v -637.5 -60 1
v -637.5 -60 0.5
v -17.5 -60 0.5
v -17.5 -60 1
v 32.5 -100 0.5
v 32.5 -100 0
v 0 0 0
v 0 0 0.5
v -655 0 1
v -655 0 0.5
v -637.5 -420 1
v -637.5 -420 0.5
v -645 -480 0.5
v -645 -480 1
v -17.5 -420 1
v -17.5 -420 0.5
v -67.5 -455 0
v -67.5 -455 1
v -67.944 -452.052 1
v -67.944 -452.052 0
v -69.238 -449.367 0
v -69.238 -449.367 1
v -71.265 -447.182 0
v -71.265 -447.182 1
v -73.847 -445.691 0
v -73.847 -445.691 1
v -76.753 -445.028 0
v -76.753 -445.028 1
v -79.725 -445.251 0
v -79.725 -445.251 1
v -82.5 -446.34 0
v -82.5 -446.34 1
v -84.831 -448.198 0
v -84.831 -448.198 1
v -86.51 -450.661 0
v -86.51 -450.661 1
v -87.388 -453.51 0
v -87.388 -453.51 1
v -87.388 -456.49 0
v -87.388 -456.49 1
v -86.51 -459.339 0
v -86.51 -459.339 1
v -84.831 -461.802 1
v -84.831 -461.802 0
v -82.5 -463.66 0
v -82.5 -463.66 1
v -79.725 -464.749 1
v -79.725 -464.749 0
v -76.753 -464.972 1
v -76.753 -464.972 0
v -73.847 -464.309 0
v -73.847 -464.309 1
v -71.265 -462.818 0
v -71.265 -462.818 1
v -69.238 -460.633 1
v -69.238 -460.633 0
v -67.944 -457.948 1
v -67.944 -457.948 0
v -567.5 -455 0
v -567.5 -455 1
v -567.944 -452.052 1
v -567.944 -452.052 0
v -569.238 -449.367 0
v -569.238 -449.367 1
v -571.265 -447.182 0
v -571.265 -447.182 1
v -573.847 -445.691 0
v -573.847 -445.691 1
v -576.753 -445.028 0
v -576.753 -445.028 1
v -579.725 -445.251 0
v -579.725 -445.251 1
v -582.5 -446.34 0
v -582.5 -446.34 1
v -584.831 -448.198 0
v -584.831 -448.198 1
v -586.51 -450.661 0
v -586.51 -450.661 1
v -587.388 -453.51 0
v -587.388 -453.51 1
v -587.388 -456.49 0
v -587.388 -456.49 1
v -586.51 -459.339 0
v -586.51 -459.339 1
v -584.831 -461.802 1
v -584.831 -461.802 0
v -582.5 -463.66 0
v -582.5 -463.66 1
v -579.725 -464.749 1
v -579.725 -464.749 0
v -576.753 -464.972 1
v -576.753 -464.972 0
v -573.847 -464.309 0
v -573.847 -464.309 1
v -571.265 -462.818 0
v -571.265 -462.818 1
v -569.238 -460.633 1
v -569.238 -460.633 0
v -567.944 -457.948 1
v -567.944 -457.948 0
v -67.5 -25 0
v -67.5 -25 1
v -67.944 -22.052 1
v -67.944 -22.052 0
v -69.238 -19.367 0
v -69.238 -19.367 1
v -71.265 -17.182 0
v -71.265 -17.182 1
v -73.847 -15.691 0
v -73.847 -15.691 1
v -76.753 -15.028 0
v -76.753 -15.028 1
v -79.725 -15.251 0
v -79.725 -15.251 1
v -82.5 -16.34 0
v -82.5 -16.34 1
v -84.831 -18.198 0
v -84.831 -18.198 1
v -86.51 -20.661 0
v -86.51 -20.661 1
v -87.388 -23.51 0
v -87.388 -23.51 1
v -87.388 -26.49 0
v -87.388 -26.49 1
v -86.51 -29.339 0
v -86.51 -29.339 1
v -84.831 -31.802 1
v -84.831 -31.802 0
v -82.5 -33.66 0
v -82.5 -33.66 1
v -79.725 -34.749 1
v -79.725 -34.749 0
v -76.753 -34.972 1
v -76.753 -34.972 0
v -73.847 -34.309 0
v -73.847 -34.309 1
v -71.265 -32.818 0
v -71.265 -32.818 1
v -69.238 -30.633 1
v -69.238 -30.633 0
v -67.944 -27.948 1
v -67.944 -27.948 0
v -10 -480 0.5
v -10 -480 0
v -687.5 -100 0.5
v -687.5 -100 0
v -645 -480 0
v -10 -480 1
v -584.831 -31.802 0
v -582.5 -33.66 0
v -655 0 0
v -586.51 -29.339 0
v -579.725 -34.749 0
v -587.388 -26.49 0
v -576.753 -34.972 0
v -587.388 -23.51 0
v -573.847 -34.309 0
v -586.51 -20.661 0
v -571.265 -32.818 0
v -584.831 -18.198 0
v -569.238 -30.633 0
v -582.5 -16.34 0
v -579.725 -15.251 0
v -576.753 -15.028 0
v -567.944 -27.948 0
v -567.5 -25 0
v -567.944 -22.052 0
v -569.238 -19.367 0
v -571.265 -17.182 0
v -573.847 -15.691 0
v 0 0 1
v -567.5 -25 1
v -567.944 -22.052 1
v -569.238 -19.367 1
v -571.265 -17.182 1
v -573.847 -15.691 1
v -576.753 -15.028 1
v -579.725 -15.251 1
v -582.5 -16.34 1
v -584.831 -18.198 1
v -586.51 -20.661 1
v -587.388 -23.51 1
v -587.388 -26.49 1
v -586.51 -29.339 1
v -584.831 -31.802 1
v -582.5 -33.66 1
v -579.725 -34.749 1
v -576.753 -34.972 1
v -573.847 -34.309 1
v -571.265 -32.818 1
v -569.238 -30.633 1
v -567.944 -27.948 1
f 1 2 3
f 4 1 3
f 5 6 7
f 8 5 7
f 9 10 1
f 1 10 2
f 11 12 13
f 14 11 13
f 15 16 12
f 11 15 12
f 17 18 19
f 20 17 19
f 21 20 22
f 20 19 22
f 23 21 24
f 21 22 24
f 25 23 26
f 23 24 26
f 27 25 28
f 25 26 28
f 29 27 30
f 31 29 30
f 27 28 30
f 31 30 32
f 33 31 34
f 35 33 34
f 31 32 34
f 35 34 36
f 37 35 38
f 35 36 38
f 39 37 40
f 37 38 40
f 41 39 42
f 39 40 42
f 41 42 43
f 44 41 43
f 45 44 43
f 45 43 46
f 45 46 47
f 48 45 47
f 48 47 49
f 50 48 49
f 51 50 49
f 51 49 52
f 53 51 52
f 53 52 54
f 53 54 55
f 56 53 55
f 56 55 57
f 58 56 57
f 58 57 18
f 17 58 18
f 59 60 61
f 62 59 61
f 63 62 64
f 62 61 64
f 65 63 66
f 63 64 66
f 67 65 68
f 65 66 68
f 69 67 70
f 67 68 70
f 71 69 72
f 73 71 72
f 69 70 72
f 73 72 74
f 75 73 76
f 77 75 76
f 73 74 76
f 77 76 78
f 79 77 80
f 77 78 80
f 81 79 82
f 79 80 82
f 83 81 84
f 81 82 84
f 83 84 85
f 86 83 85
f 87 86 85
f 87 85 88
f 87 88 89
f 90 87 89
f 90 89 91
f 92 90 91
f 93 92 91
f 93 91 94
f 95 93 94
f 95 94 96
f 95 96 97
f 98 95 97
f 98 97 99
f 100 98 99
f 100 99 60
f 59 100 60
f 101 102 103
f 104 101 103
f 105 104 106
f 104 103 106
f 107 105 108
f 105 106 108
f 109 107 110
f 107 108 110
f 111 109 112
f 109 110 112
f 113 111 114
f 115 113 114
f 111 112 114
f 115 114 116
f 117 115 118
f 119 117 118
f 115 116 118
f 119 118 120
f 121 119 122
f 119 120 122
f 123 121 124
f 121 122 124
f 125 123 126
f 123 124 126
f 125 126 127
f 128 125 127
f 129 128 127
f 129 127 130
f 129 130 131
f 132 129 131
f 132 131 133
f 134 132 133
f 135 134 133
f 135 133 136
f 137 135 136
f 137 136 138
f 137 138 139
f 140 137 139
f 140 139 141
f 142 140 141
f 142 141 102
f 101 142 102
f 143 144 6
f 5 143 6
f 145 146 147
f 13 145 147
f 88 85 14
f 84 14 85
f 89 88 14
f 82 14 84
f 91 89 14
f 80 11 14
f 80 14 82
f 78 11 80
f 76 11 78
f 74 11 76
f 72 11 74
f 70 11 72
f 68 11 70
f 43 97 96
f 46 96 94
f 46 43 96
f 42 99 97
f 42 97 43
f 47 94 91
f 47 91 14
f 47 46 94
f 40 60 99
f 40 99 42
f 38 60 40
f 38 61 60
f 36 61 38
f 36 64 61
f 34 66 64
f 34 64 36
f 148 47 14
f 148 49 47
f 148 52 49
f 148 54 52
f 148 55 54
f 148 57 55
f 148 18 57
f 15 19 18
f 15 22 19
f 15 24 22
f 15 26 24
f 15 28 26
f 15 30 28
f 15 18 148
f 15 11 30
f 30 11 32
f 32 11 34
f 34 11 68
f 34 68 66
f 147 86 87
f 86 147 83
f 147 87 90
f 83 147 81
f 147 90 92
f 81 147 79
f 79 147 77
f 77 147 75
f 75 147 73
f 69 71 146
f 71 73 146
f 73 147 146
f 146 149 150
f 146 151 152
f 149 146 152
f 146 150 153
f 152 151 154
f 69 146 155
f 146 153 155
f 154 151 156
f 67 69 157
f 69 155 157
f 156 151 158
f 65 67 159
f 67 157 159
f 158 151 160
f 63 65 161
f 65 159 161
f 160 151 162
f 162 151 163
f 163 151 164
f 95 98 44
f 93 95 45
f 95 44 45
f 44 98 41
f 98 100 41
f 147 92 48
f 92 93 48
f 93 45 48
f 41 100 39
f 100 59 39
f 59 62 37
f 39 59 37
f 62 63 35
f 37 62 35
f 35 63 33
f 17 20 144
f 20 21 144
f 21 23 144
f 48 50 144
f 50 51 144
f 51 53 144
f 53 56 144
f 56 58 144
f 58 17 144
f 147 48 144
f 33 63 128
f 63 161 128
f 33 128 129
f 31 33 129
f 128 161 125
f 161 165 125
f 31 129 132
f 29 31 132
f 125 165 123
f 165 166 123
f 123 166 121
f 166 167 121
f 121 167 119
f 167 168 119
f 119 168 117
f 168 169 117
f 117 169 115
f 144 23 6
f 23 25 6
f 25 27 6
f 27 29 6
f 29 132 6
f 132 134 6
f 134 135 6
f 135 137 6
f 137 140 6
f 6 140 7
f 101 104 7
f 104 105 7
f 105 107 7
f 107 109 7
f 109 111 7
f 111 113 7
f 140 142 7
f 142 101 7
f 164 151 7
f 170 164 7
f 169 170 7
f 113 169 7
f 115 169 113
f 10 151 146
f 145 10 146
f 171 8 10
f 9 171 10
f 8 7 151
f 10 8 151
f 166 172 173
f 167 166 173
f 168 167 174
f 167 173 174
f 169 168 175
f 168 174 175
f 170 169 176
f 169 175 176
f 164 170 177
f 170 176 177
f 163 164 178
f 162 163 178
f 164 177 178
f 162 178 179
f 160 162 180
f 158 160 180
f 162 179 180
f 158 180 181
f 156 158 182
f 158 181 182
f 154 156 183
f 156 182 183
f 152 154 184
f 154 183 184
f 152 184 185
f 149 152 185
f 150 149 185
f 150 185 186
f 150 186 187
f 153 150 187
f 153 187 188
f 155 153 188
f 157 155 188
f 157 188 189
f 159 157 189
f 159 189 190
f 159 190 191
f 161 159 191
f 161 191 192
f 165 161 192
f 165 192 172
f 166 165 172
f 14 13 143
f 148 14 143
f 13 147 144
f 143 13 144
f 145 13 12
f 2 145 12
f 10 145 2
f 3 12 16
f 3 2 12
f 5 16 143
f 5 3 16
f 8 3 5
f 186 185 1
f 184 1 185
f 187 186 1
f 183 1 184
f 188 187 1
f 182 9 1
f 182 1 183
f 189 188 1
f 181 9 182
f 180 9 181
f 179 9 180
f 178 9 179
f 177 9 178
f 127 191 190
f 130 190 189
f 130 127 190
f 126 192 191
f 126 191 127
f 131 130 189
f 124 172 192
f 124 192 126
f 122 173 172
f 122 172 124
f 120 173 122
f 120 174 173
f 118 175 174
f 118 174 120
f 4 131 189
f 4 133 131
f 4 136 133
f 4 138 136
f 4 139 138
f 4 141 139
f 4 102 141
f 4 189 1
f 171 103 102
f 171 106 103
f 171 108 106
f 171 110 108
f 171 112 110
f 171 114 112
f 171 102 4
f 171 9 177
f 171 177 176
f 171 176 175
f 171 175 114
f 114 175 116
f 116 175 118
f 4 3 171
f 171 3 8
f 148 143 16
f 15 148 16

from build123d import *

# Parameters (mm, degrees)
F1_DEPTH = 0.5
F3_DEPTH = 0.5
F4_R     = 10
F5_DEPTH = 25


with BuildPart() as f1:
    # F0 (on Top) → F1 (new body)
    with BuildSketch(Plane.XY):
        Polygon((0, 0), (-655, 0), (-687.5, -100), (-645, -480), (-10, -480), (32.5, -100), align=None)
    extrude(amount=F1_DEPTH)

    # F2 (on face) → F3 (join)
    with BuildSketch(Plane.XY.offset(0.5)):
        Polygon((0, 0), (-655, 0), (-637.5, -60), (-17.5, -60), align=None)
        Polygon((-645, -480), (-10, -480), (-17.5, -420), (-637.5, -420), align=None)
    extrude(amount=F3_DEPTH)

    # F4 (on face) → F5 (cut)
    with BuildSketch(Plane.XY.offset(1)):
        with Locations((-577.5, -25)):
            Circle(F4_R)
        with Locations((-577.5, -455)):
            Circle(F4_R)
        with Locations((-77.5, -25)):
            Circle(F4_R)
        with Locations((-77.5, -455)):
            Circle(F4_R)
    extrude(amount=-F5_DEPTH, mode=Mode.SUBTRACT)


solid = f1.part
